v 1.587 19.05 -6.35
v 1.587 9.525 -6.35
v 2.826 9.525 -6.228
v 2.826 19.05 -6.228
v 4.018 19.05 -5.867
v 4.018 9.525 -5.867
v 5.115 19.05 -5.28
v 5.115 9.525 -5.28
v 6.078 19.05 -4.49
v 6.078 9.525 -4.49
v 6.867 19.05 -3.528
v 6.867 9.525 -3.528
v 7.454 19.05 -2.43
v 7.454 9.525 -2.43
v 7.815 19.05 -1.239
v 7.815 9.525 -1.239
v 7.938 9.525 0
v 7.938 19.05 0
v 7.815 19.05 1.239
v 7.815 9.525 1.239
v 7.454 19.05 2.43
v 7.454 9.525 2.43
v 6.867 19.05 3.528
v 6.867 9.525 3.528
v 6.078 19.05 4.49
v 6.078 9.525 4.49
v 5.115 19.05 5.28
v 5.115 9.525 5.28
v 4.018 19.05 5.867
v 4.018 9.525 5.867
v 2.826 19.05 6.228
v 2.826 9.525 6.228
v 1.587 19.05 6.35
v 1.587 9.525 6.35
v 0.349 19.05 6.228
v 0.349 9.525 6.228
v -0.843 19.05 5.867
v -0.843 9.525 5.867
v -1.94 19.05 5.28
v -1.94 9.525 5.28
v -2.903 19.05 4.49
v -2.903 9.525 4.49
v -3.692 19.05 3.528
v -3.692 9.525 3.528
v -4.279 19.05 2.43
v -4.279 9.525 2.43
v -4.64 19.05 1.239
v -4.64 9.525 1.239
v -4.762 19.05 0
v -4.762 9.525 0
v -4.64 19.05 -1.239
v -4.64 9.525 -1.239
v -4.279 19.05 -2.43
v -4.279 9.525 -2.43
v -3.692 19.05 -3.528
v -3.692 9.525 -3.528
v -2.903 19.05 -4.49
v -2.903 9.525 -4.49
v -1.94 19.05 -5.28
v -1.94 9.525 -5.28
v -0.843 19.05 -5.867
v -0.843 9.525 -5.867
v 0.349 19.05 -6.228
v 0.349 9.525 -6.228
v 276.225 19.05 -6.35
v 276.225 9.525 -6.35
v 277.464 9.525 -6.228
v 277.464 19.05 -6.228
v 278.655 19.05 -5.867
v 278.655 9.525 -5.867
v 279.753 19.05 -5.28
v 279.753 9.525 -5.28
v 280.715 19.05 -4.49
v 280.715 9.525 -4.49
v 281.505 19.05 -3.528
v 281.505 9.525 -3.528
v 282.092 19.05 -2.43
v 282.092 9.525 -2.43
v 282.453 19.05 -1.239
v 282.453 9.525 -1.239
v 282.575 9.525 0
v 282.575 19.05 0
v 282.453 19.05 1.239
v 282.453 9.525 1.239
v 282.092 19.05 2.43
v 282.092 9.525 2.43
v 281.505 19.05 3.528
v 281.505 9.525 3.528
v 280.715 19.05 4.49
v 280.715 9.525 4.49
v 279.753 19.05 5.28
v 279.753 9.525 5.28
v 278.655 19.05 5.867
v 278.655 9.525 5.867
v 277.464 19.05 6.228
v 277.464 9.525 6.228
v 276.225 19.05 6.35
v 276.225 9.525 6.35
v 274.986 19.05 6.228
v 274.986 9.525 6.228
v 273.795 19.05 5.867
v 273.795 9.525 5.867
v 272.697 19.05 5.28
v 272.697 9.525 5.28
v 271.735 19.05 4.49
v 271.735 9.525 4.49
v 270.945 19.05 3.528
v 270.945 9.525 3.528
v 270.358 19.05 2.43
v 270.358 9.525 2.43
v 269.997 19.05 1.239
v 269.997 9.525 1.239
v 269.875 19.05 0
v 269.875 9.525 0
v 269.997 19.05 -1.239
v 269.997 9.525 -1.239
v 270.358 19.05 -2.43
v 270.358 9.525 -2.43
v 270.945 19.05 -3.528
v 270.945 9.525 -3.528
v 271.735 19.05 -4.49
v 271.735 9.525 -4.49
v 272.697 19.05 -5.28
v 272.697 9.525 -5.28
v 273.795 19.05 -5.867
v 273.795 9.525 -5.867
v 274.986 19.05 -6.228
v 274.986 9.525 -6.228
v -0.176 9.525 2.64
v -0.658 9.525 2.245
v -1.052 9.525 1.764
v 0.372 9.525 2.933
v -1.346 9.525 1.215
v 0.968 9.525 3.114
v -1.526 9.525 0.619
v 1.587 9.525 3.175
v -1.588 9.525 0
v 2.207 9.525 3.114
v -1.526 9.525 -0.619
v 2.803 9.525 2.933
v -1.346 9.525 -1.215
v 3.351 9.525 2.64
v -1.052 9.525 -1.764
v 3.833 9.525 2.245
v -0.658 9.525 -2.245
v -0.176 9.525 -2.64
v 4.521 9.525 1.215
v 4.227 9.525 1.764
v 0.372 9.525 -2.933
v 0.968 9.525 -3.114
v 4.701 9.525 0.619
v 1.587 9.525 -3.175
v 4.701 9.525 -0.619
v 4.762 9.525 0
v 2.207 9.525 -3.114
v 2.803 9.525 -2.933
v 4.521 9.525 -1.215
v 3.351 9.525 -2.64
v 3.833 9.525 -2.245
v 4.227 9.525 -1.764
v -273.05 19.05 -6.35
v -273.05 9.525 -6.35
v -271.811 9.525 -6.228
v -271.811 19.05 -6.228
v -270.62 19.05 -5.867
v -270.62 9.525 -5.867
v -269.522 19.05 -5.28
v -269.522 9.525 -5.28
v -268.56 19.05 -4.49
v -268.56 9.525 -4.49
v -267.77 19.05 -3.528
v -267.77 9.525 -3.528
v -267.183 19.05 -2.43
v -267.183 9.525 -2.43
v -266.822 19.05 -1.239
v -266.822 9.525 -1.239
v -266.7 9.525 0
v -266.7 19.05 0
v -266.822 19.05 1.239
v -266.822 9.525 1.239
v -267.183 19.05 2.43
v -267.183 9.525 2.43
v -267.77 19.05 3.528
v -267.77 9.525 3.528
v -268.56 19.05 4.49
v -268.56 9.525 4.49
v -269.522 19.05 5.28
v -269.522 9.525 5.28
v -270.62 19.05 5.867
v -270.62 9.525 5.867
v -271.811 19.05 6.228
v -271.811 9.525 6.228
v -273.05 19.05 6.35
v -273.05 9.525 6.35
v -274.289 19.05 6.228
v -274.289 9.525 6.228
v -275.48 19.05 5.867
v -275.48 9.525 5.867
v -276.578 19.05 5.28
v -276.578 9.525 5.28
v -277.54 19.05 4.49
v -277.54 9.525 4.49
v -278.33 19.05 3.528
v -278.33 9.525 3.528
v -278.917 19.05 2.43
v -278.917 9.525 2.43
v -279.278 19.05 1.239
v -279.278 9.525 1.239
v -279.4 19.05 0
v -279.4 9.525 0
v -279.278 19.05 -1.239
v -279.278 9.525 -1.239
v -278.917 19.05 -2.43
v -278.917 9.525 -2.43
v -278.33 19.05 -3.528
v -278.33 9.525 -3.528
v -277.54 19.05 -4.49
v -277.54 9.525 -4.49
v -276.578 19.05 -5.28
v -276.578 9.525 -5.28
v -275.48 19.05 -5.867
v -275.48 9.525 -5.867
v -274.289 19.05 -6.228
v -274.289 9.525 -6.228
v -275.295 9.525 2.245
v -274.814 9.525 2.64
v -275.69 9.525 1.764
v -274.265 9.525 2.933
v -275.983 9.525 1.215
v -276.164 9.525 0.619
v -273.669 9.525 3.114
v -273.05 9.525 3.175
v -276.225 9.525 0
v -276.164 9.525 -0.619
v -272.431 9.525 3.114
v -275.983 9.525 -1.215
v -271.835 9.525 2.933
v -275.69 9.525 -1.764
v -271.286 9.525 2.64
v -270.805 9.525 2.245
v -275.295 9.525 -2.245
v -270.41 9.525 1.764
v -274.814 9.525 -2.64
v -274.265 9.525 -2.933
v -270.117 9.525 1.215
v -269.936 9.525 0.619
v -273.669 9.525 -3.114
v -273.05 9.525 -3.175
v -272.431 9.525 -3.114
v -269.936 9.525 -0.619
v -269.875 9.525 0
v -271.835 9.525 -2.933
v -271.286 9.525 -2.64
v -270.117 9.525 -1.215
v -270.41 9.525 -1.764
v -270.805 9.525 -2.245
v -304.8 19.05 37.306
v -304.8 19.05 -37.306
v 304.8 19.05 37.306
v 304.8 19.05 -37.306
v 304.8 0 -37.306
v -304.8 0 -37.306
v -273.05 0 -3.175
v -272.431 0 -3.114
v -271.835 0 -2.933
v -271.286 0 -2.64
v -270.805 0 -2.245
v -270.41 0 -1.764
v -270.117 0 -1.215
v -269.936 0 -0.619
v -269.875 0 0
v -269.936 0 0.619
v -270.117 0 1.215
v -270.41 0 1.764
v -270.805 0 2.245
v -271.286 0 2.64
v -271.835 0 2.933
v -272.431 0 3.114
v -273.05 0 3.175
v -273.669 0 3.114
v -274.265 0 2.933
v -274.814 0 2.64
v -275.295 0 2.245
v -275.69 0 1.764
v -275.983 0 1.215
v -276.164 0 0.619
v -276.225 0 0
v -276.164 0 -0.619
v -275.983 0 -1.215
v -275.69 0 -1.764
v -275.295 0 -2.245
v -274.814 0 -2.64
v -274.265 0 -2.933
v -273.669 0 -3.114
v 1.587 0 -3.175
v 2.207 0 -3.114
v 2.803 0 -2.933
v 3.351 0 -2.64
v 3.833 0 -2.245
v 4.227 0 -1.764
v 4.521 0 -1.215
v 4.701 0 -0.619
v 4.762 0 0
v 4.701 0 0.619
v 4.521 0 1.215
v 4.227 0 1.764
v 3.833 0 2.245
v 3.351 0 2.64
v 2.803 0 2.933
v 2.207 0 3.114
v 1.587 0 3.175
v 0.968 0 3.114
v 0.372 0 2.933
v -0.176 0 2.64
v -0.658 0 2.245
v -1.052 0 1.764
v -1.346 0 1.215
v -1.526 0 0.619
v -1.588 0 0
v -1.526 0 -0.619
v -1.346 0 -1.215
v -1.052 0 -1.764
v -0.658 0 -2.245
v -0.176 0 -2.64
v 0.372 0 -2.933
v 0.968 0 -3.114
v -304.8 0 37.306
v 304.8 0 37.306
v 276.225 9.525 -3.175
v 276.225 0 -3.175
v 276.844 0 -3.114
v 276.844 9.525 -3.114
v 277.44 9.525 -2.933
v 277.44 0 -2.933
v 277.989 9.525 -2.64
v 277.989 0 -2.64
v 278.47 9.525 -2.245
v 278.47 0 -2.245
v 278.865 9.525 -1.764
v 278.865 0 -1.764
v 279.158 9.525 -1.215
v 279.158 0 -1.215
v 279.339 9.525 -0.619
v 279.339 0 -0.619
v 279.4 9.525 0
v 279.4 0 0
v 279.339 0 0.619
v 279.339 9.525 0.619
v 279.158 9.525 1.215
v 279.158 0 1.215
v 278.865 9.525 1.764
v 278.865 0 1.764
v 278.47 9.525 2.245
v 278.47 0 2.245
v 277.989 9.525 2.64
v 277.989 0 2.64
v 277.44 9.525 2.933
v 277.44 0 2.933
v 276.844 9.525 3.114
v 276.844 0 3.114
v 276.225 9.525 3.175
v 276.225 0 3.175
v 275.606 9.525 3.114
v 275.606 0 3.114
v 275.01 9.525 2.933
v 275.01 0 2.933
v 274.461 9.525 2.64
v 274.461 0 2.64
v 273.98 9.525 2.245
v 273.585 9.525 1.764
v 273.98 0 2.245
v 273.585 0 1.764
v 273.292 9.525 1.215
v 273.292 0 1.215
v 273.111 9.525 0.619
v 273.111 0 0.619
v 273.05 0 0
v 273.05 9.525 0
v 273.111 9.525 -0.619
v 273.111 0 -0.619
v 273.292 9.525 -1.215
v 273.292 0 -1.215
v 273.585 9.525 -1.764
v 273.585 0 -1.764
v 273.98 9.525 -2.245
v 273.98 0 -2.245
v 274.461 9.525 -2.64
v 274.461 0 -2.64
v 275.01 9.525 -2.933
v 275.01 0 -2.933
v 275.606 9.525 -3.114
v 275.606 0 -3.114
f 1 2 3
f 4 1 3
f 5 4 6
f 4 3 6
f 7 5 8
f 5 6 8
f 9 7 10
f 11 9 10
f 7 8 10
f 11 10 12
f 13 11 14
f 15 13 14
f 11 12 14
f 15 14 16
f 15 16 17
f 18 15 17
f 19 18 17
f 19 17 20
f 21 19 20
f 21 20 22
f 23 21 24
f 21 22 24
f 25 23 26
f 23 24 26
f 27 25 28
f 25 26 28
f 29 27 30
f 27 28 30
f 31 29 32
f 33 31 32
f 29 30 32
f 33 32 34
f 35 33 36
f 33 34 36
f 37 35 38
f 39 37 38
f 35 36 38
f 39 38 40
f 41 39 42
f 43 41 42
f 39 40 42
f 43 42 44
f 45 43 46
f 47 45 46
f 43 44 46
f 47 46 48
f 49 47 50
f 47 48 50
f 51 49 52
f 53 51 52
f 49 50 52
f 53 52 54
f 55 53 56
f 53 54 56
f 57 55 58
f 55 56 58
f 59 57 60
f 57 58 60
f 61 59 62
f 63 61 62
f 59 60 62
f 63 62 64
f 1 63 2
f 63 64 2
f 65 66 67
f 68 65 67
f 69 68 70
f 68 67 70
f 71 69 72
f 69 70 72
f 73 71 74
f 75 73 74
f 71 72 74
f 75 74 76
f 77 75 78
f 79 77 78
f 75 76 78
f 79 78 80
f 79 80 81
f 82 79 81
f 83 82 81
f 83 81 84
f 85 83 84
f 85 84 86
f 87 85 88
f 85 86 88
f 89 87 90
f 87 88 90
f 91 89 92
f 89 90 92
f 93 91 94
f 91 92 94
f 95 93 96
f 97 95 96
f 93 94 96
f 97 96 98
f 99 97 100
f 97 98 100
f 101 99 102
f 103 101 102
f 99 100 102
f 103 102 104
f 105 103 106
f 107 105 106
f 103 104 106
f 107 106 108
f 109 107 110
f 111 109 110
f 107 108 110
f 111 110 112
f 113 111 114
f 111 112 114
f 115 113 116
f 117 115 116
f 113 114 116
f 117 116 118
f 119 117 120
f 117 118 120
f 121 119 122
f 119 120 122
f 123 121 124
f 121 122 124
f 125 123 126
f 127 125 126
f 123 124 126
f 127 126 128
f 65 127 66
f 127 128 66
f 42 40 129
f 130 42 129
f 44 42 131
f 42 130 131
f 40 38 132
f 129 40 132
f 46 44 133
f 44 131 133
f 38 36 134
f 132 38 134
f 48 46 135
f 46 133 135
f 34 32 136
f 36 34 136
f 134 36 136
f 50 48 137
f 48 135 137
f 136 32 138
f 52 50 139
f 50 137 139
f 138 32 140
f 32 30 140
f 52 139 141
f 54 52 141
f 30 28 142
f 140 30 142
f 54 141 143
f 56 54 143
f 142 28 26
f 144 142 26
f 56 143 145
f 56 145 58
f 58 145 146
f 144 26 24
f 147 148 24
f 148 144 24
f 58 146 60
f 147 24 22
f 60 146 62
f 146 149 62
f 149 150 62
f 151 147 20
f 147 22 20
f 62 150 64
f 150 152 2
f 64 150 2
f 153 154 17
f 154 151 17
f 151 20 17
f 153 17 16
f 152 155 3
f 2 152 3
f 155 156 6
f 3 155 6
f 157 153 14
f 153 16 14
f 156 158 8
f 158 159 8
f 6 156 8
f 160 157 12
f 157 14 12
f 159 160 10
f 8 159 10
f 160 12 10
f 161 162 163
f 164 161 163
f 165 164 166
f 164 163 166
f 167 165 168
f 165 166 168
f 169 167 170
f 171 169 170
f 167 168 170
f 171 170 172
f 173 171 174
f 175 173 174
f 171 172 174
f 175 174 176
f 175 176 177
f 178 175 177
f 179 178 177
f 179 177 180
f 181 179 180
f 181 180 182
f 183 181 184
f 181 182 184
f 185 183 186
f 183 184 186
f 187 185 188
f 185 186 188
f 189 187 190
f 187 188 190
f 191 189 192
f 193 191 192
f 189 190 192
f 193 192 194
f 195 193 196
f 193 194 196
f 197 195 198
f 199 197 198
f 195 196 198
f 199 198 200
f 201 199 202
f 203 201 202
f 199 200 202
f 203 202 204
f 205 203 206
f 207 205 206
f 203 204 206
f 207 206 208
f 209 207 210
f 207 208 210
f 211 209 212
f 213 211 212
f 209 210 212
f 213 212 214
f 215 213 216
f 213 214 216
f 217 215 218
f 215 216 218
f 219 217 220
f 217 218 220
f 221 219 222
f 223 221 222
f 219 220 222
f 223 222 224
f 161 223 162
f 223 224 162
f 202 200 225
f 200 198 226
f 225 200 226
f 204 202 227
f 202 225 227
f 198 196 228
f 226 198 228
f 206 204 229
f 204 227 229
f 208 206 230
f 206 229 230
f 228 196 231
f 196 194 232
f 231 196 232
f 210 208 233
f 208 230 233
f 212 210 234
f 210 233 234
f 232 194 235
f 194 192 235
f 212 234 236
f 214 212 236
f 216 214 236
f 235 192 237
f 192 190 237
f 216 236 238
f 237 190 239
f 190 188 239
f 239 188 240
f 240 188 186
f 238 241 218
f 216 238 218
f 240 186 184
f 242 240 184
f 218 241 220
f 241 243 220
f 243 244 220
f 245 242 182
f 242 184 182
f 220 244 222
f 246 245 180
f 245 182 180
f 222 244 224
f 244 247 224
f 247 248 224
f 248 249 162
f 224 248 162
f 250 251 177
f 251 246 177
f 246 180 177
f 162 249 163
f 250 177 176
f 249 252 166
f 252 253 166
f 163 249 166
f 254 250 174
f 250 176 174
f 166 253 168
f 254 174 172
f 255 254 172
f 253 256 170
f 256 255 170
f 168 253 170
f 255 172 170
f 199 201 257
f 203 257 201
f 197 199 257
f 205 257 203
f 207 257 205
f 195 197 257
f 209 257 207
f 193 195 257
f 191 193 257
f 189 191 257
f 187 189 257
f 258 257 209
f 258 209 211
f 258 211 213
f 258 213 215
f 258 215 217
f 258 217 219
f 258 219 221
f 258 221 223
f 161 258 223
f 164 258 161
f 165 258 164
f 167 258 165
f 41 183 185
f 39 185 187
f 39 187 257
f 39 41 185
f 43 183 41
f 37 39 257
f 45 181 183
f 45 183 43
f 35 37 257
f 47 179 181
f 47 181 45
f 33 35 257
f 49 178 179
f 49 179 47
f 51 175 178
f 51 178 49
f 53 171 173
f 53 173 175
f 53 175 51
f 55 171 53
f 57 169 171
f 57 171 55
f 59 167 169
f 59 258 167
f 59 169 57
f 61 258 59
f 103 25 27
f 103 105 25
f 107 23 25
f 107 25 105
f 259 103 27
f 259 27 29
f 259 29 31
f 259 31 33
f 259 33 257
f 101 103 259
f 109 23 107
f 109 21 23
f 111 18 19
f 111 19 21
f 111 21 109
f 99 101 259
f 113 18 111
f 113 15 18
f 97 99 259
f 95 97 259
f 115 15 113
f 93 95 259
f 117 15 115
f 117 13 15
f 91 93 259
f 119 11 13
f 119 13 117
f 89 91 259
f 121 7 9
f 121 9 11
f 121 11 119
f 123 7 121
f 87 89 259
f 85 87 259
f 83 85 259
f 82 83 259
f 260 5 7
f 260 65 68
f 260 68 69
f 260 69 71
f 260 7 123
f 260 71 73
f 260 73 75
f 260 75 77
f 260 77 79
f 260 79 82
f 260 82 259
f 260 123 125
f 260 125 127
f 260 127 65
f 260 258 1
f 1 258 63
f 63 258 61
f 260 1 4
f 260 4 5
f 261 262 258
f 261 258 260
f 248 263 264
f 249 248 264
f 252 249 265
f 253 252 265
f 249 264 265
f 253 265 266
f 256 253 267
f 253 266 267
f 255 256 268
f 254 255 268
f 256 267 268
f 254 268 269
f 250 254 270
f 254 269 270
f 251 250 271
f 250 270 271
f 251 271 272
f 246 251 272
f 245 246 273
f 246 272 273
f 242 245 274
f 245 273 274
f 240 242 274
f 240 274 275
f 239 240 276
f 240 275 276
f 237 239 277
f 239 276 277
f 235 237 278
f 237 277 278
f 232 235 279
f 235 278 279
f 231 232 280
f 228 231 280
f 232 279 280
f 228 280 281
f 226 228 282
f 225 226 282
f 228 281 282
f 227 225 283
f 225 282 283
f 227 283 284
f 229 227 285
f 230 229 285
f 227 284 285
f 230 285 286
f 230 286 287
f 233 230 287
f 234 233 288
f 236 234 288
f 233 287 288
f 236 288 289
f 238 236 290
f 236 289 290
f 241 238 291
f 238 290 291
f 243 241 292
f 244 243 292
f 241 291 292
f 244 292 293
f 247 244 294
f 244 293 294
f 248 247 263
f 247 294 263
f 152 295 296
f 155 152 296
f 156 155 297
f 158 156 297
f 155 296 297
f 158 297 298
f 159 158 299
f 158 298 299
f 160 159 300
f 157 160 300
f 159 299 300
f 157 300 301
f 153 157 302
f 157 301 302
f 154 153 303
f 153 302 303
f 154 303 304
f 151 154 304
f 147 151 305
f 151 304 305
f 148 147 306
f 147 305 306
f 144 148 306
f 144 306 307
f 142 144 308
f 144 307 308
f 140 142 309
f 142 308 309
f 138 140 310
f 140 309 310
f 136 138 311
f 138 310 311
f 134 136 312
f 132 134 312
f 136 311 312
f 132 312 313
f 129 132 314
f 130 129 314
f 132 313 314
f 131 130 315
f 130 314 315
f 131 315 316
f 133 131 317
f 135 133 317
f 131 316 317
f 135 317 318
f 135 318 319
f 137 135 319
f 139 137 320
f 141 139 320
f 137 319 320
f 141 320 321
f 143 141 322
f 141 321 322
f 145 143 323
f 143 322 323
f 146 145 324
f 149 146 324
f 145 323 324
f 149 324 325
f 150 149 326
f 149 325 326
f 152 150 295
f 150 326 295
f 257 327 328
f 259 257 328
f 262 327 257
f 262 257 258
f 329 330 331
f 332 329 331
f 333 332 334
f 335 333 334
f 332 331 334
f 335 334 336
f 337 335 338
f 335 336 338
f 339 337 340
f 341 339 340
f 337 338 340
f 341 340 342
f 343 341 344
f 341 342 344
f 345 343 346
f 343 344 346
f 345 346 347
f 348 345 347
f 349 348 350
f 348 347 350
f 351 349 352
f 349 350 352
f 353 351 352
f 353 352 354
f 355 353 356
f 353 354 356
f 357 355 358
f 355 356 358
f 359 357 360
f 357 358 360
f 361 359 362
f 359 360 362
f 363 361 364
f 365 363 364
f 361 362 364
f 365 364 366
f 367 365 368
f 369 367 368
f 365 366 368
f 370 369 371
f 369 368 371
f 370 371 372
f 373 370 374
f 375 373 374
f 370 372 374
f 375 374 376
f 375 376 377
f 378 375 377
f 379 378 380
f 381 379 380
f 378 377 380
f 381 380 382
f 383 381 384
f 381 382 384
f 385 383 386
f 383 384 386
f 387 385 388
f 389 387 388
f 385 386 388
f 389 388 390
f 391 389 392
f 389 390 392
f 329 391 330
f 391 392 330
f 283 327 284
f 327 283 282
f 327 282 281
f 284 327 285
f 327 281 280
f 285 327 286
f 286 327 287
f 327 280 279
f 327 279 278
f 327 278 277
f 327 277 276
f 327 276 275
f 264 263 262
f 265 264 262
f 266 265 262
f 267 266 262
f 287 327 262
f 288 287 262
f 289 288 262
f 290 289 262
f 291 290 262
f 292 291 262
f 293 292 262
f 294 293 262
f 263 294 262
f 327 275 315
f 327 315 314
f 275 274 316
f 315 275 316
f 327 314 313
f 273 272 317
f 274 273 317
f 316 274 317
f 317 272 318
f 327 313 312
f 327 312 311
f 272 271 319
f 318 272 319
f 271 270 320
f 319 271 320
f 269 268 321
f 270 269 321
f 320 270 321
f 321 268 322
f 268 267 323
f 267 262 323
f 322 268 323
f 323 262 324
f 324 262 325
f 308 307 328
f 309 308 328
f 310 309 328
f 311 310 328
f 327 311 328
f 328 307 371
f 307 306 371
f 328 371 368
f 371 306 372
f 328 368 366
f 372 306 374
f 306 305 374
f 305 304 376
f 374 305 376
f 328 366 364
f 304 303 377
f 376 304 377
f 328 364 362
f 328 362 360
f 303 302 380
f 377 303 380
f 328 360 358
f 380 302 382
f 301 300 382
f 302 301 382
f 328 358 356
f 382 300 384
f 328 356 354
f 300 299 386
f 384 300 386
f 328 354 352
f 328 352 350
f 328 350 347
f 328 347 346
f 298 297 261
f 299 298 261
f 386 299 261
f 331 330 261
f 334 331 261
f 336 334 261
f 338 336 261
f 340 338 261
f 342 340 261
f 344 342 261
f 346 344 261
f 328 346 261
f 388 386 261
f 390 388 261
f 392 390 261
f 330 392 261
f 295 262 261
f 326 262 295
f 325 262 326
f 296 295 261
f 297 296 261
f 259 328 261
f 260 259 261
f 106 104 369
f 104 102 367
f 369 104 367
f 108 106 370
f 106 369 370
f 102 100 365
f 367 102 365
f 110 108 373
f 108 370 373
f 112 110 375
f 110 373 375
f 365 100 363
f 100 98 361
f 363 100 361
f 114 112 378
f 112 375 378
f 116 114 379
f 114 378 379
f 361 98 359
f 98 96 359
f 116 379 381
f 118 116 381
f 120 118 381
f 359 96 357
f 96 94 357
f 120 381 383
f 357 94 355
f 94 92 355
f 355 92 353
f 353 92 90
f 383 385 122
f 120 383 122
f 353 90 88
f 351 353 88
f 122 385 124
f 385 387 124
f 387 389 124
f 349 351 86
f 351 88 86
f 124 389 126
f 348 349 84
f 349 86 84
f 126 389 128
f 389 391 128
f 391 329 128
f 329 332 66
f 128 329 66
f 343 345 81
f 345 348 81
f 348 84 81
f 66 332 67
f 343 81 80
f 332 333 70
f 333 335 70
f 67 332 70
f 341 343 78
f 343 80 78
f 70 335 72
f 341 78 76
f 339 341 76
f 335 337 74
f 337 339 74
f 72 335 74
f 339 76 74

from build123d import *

# Parameters (mm, degrees)
SKETCH1_W           = 609.6
SKETCH1_H           = 74.6125
BOSS_EXTRUDE1_DEPTH = 19.05
SKETCH2_R           = 3.175
CUT_EXTRUDE1_DEPTH  = 9.525
CUT_EXTRUDE2_START  = -9.525
SKETCH4_R           = 6.35
CUT_EXTRUDE2_DEPTH  = 9.525
SKETCH5_R           = 3.175
CUT_EXTRUDE3_DEPTH  = 9.525
CUT_EXTRUDE4_START  = -9.525
SKETCH6_R           = 6.35
CUT_EXTRUDE4_DEPTH  = 9.525
SKETCH7_R           = 3.175
CUT_EXTRUDE5_DEPTH  = 9.525
CUT_EXTRUDE6_START  = -9.525
SKETCH8_R           = 6.35
CUT_EXTRUDE6_DEPTH  = 9.525


with BuildPart() as part:
    # Sketch1 → Boss-Extrude1 (new body)
    with BuildSketch(Plane(origin=(0, 0, 0), x_dir=(1, 0, 0), z_dir=(0, 1, 0))):
        Rectangle(SKETCH1_W, SKETCH1_H)
    extrude(amount=BOSS_EXTRUDE1_DEPTH)

    # Sketch2 → Cut-Extrude1 (cut)
    with BuildSketch(Plane.XZ):
        with Locations(Location((1.5875, 0, 0), (0, 0, 270))):
            Circle(SKETCH2_R)
    extrude(amount=-CUT_EXTRUDE1_DEPTH, mode=Mode.SUBTRACT)

    # Sketch4 → Cut-Extrude2 (cut)
    with BuildSketch(Plane.XZ.offset(CUT_EXTRUDE2_START)):
        with Locations(Location((1.5875, 0, 0), (0, 0, 270))):
            Circle(SKETCH4_R)
    extrude(amount=-CUT_EXTRUDE2_DEPTH, mode=Mode.SUBTRACT)

    # Sketch5 → Cut-Extrude3 (cut)
    with BuildSketch(Plane.XZ):
        with Locations(Location((276.225, 0, 0), (0, 0, 270))):
            Circle(SKETCH5_R)
    extrude(amount=-CUT_EXTRUDE3_DEPTH, mode=Mode.SUBTRACT)

    # Sketch6 → Cut-Extrude4 (cut)
    with BuildSketch(Plane.XZ.offset(CUT_EXTRUDE4_START)):
        with Locations(Location((276.225, 0, 0), (0, 0, 270))):
            Circle(SKETCH6_R)
    extrude(amount=-CUT_EXTRUDE4_DEPTH, mode=Mode.SUBTRACT)

    # Sketch7 → Cut-Extrude5 (cut)
    with BuildSketch(Plane.XZ):
        with Locations(Location((-273.05, 0, 0), (0, 0, 270))):
            Circle(SKETCH7_R)
    extrude(amount=-CUT_EXTRUDE5_DEPTH, mode=Mode.SUBTRACT)

    # Sketch8 → Cut-Extrude6 (cut)
    with BuildSketch(Plane.XZ.offset(CUT_EXTRUDE6_START)):
        with Locations(Location((-273.05, 0, 0), (0, 0, 270))):
            Circle(SKETCH8_R)
    extrude(amount=-CUT_EXTRUDE6_DEPTH, mode=Mode.SUBTRACT)


solid = part.part
